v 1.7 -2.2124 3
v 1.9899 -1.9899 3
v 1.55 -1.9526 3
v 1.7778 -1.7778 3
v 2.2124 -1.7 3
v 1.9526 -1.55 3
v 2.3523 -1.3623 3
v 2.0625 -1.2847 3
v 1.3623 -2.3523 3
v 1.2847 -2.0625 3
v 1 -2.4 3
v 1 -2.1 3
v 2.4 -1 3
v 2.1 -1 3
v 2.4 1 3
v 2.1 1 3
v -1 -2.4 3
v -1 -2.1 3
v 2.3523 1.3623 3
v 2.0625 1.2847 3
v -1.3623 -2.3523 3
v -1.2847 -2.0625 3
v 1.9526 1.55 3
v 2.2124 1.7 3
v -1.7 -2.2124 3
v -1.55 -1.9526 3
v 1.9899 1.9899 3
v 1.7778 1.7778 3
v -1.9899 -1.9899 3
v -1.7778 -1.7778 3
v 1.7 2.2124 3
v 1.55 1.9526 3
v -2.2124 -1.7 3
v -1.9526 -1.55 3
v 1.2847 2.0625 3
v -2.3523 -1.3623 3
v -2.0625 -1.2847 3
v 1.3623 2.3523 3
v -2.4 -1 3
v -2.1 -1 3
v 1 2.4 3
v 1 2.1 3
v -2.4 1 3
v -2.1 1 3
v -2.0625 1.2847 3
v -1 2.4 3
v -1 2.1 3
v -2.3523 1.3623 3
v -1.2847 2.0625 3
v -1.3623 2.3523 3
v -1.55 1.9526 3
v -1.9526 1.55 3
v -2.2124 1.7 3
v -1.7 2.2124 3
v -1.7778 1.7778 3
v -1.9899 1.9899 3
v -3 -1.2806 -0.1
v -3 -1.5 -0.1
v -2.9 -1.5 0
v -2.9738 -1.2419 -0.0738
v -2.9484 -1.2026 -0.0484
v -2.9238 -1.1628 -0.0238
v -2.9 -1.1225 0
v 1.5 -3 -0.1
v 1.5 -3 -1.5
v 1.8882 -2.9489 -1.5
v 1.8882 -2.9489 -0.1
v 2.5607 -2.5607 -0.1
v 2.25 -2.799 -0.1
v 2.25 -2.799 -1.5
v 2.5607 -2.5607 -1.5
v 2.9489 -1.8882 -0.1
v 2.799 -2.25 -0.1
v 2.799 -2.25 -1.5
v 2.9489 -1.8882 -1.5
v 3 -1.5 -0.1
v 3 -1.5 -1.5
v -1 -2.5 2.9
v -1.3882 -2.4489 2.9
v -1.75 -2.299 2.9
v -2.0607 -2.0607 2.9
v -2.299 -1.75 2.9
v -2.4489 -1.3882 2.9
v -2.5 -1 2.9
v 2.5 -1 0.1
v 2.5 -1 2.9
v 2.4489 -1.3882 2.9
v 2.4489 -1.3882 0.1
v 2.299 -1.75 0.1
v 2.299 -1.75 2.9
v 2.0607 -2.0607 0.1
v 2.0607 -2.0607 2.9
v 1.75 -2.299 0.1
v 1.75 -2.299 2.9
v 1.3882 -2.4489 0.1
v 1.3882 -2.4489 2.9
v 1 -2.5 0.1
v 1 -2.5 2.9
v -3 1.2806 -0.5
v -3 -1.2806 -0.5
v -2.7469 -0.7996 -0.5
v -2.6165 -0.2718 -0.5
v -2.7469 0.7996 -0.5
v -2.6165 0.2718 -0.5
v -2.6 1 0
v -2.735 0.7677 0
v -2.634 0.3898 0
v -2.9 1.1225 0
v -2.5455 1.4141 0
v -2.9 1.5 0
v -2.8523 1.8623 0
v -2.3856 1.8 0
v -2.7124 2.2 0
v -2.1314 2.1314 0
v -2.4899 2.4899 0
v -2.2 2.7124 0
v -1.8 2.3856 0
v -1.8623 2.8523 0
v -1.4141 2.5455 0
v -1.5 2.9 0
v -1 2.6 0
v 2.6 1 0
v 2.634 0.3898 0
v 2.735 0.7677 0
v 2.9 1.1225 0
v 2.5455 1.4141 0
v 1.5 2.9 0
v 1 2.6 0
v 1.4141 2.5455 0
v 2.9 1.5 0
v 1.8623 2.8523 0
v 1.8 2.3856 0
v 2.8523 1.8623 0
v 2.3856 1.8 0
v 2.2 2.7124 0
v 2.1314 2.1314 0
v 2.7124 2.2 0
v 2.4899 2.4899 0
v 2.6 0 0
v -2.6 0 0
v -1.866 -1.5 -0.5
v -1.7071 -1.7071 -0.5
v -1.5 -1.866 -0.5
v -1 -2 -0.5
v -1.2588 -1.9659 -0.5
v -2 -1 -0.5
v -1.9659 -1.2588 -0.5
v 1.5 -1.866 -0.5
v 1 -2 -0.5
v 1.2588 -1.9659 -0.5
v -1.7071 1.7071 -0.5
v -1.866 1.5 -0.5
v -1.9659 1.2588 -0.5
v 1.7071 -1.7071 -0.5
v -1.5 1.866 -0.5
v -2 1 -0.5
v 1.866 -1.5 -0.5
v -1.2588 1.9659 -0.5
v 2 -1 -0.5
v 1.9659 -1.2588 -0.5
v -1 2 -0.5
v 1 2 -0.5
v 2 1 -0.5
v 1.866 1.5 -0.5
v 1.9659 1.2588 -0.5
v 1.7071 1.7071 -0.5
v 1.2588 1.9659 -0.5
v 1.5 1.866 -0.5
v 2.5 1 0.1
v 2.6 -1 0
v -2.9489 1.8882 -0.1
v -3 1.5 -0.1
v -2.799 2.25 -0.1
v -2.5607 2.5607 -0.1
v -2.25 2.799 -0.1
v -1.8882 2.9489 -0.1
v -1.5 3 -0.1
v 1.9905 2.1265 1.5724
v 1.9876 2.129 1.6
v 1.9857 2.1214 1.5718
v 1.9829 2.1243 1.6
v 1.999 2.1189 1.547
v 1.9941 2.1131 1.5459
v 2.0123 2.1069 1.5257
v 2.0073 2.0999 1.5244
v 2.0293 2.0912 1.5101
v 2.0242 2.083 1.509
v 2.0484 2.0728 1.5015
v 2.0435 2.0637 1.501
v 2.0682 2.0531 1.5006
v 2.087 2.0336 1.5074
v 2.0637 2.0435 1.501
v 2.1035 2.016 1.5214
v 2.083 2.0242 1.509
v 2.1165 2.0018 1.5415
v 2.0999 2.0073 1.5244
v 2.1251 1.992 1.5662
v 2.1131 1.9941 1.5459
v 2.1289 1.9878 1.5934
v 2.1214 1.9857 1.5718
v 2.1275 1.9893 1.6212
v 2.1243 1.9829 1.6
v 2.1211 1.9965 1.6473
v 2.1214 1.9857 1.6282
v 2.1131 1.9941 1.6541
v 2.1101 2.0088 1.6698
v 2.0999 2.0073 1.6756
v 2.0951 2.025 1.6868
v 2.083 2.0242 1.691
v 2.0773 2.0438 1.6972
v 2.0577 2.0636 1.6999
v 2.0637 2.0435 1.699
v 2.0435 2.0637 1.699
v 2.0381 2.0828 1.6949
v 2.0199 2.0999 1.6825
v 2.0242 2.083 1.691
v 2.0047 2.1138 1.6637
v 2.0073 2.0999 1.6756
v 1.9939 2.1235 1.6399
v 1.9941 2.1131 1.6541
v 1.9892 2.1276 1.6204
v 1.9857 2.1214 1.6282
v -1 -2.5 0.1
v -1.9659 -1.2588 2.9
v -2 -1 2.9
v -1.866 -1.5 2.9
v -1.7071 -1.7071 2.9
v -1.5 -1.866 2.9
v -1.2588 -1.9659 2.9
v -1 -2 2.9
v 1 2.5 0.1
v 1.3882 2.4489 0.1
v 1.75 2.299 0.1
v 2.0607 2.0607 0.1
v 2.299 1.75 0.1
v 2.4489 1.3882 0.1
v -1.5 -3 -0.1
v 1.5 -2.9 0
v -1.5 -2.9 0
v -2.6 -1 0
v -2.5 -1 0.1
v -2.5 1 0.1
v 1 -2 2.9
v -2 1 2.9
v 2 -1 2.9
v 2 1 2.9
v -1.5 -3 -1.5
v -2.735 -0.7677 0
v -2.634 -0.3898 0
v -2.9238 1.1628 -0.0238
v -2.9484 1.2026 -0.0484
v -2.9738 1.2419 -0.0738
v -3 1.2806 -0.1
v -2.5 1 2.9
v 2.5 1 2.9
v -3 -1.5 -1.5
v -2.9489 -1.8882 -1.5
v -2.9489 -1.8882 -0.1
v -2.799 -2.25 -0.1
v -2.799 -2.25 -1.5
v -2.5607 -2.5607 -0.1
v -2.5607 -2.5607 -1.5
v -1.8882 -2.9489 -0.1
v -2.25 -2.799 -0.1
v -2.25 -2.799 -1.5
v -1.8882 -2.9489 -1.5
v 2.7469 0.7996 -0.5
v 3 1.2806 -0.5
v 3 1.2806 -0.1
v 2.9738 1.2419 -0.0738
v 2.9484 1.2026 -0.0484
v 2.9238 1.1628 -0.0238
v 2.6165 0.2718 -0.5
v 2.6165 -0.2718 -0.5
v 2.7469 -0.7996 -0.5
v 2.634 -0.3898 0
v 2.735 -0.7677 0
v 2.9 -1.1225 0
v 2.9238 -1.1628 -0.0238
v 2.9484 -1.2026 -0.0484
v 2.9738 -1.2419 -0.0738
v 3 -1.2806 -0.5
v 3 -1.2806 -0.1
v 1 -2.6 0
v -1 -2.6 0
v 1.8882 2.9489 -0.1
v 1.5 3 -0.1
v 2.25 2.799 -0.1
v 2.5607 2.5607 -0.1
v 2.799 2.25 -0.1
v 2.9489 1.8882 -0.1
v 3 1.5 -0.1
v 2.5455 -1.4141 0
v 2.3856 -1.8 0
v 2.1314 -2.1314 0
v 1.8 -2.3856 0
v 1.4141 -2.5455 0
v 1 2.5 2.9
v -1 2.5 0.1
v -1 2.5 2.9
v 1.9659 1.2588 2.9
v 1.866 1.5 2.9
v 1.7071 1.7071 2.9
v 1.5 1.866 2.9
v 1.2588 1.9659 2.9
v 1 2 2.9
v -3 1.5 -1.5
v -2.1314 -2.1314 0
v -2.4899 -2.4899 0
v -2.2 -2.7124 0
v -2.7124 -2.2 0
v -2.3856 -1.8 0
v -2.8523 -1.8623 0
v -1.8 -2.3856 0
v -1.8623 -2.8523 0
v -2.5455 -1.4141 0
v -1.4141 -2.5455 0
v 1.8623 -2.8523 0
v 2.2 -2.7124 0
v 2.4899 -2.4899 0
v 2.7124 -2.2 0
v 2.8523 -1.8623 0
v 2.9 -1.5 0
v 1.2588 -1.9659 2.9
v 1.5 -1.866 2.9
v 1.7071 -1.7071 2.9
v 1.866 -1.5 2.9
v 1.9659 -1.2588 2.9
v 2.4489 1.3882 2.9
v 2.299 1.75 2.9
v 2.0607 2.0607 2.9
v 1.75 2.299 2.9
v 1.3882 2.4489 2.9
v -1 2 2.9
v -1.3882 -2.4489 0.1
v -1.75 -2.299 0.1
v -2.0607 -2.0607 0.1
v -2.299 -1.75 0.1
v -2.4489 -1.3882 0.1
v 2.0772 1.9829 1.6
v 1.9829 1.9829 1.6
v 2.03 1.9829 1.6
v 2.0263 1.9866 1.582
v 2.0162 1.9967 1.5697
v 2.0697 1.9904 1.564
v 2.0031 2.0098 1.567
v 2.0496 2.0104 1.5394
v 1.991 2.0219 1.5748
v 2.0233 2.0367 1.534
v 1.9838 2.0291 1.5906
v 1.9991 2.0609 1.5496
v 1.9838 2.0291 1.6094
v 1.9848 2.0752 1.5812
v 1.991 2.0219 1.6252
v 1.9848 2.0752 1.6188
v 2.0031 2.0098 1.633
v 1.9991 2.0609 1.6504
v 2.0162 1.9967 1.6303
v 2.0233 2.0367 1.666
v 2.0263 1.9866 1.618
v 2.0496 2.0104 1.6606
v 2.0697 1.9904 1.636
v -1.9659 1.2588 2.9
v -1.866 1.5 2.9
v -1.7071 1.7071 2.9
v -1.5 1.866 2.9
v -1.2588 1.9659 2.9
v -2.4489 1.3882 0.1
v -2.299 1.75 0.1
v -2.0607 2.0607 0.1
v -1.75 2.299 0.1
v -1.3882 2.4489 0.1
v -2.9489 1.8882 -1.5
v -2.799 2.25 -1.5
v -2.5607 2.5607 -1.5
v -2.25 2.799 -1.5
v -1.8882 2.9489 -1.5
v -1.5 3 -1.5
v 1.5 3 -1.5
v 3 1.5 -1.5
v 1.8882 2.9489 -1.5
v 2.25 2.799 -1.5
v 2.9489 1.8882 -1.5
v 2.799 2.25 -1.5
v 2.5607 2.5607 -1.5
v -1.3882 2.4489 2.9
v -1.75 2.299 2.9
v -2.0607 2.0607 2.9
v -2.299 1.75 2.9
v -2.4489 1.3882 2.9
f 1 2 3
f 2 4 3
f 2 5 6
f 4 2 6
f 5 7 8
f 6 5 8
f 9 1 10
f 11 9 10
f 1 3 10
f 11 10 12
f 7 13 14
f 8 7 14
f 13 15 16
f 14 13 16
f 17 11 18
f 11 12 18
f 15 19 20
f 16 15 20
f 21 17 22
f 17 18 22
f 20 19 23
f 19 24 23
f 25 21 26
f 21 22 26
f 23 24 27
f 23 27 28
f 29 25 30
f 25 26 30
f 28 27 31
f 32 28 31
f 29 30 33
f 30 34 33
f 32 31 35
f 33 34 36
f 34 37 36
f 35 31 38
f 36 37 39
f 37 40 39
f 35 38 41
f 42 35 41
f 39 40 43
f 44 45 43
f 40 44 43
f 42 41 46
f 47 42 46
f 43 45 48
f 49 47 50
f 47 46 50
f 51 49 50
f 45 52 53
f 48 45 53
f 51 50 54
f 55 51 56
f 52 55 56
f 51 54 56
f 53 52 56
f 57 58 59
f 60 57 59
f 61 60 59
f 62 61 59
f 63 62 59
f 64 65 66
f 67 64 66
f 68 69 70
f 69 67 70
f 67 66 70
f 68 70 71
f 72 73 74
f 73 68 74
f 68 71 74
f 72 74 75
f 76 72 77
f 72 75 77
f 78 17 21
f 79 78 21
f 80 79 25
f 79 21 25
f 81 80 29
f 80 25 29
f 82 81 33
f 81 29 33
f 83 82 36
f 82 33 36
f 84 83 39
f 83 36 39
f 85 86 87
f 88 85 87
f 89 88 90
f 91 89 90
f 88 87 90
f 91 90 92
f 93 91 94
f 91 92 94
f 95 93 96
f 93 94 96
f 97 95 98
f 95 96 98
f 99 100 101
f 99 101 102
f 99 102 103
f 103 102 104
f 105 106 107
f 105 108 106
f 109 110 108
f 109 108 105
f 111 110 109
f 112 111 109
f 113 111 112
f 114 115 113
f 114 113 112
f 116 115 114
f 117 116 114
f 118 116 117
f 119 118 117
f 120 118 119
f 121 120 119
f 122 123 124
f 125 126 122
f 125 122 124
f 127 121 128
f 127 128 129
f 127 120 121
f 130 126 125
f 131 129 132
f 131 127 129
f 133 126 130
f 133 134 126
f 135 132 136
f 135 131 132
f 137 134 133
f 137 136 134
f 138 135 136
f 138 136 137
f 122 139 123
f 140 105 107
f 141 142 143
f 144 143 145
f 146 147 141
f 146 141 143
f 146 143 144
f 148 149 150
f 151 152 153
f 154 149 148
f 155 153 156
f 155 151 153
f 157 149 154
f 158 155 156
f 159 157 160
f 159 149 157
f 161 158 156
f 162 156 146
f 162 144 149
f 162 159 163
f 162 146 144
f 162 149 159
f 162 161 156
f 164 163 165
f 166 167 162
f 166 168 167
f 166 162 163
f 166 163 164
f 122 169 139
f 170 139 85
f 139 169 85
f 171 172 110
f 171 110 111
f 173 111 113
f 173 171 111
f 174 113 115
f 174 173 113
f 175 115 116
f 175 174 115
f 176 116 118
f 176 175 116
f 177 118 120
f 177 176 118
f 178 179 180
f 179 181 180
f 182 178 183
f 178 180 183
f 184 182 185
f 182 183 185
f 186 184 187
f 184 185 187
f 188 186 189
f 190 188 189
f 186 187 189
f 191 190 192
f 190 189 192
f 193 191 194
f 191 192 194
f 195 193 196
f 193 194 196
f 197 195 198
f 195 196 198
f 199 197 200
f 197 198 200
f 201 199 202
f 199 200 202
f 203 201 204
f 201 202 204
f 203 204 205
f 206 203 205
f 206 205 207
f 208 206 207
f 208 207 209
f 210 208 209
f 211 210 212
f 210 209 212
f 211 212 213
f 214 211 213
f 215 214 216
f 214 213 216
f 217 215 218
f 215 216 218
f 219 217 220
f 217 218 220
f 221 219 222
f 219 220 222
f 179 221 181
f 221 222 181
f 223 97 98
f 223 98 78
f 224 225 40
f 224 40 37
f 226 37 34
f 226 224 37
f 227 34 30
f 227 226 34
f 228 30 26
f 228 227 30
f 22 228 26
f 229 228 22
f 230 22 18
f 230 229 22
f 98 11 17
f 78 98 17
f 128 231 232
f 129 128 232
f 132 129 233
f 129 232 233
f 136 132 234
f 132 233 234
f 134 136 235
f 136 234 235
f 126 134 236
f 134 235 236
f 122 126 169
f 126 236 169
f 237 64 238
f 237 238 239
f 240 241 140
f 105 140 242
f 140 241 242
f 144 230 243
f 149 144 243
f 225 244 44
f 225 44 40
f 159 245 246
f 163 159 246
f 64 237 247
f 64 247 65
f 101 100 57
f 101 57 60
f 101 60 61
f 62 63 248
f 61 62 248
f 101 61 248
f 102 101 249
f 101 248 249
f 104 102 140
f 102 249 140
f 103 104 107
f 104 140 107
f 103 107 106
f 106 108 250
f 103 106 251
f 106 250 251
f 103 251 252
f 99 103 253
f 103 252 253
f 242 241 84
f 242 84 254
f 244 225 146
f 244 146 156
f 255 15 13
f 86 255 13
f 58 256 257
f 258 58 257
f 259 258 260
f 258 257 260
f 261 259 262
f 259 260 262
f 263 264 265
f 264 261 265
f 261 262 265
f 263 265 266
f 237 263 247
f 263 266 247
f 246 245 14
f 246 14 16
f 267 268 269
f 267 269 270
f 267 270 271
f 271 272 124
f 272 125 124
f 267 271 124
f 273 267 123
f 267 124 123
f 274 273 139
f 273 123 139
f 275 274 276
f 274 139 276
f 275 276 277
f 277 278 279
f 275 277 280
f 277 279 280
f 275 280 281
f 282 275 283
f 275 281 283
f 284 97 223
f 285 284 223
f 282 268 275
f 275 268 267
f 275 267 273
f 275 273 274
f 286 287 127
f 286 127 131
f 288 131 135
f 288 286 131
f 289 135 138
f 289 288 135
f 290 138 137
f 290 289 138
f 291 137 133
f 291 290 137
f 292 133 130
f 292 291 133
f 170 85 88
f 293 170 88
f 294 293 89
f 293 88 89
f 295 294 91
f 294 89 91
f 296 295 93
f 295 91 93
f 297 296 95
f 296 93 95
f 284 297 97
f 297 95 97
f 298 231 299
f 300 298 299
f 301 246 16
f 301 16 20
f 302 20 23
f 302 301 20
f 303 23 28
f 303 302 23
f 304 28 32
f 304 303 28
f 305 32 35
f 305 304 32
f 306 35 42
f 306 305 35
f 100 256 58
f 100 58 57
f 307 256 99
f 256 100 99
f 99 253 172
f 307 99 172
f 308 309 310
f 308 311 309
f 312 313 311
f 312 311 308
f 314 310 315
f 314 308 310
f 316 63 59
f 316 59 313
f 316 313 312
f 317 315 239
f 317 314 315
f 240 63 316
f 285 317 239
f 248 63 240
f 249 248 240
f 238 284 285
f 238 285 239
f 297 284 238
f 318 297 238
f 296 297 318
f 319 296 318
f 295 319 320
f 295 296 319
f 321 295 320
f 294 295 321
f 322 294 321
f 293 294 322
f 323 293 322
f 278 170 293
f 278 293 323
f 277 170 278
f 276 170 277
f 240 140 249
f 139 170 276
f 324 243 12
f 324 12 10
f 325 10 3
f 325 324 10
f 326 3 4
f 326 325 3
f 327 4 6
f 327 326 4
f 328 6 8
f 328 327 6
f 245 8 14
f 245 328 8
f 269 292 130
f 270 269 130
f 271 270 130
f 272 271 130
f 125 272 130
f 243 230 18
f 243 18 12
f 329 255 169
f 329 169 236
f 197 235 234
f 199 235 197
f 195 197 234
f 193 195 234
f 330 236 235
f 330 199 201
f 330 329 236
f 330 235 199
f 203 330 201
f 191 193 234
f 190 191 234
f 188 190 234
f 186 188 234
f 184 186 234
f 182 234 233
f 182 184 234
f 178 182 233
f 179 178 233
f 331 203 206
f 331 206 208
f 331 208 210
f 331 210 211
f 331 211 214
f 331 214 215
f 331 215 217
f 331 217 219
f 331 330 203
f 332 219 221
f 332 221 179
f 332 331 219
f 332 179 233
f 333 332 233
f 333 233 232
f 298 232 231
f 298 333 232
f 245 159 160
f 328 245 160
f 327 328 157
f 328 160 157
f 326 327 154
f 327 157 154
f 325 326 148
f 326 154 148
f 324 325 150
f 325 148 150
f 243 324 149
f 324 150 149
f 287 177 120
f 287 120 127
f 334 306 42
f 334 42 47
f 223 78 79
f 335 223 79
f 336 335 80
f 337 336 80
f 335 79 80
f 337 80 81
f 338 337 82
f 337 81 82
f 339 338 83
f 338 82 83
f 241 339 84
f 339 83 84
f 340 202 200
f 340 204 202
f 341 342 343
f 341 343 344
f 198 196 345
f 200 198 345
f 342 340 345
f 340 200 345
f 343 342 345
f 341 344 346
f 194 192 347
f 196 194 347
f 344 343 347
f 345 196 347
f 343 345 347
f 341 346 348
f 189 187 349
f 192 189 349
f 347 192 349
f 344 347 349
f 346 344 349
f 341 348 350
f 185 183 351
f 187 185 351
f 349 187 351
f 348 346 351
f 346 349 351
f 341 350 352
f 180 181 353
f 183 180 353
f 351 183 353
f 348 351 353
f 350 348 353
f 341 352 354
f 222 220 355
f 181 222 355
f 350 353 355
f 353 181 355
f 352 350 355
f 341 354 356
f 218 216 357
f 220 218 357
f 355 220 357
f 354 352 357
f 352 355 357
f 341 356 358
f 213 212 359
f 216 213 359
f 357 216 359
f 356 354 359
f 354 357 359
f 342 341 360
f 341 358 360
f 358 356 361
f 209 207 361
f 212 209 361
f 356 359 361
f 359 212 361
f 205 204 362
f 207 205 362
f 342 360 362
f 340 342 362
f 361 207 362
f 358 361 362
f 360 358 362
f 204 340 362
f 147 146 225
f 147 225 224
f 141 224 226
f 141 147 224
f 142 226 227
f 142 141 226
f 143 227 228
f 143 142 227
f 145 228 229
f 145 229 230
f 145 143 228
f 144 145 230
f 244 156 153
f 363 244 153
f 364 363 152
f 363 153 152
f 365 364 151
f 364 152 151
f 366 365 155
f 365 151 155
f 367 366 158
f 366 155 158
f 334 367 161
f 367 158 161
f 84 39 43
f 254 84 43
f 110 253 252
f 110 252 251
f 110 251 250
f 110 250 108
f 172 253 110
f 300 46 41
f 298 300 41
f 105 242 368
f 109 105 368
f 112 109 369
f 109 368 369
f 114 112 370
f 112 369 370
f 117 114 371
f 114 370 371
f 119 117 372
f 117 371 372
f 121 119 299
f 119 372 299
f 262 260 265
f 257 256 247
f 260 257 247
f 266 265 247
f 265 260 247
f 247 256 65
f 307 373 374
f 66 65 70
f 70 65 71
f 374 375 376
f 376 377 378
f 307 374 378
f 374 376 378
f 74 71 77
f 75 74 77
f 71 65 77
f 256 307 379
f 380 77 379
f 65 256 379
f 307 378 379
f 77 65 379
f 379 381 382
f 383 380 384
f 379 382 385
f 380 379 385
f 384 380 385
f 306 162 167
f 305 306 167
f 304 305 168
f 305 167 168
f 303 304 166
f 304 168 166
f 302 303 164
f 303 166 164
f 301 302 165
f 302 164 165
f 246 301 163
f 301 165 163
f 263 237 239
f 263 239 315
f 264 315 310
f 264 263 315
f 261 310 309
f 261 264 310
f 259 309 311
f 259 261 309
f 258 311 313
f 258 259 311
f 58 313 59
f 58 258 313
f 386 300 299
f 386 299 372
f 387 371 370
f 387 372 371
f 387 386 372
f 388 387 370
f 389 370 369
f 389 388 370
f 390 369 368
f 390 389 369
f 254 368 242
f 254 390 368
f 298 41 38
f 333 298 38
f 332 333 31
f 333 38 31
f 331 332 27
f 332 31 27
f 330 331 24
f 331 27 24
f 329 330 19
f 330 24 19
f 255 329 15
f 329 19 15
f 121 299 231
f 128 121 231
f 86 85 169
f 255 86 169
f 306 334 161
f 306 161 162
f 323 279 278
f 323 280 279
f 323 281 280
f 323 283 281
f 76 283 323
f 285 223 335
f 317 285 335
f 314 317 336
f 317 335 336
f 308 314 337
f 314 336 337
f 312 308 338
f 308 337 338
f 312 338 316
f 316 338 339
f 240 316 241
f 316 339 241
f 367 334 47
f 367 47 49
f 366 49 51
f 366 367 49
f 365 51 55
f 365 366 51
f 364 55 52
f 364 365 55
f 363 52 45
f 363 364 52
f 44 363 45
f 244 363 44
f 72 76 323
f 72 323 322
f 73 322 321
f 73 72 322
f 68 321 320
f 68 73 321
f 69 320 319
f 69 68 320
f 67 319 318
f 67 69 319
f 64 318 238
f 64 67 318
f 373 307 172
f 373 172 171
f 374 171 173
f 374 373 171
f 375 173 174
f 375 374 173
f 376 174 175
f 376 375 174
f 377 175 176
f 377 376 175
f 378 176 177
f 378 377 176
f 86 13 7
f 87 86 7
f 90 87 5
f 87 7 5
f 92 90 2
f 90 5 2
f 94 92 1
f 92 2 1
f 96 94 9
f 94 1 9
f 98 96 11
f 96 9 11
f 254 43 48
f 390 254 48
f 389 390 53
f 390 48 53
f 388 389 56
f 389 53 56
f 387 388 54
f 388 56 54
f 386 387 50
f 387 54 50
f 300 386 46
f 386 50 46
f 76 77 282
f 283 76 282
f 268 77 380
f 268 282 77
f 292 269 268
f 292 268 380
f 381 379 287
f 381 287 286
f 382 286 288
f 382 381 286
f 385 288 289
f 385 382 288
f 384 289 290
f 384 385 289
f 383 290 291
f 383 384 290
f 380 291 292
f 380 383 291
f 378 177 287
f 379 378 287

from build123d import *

# Parameters (mm, degrees)
SKIZZE1_W                            = 6
SKIZZE1_H                            = 6
AUFSATZ_LINEAR_AUSTRAGEN1_DEPTH      = 1.5
SKIZZE2_W                            = 5
SKIZZE2_H                            = 5
AUFSATZ_LINEAR_AUSTRAGEN2_DEPTH      = 3
SKIZZE3_W                            = 4
SKIZZE3_H                            = 4
SCHNITT_LINEAR_AUSTRAGEN1_DEPTH      = 3.5
VERRUNDUNG1_R                        = 1
VERRUNDUNG2_R                        = 1.5
VERRUNDUNG3_R                        = 1.5
FASE1_SIZE                           = 0.1
F_0_2_0_2_DURCHMESSER_BOHRUNG5_D     = 0.2
F_0_2_0_2_DURCHMESSER_BOHRUNG5_DEPTH = 0.01
F_0_2_0_2_DURCHMESSER_BOHRUNG5_TIP   = 0.1
SKIZZE7_R                            = 2.25
SCHNITT_LINEAR_AUSTRAGEN2_DEPTH      = 0.5


with BuildPart() as part:
    # Skizze1 → Aufsatz-Linear austragen1 (new body)
    with BuildSketch(Plane.XY):
        Rectangle(SKIZZE1_W, SKIZZE1_H)
    extrude(amount=-AUFSATZ_LINEAR_AUSTRAGEN1_DEPTH)

    # Skizze2 → Aufsatz-Linear austragen2 (add)
    with BuildSketch(Plane(origin=(0, 0, 0), x_dir=(-1, 0, 0), z_dir=(0, 0, -1))):
        Rectangle(SKIZZE2_W, SKIZZE2_H)
    extrude(amount=-AUFSATZ_LINEAR_AUSTRAGEN2_DEPTH)

    # Skizze3 → Schnitt-Linear austragen1 (cut)
    with BuildSketch(Plane.XY.offset(3)):
        Rectangle(SKIZZE3_W, SKIZZE3_H)
    extrude(amount=-SCHNITT_LINEAR_AUSTRAGEN1_DEPTH, mode=Mode.SUBTRACT)

    # Verrundung1
    verrundung1_edges = [part.edges().sort_by_distance(p)[0] for p in [
        (2, 2, 1.25),
        (2, -2, 1.25),
        (-2, -2, 1.25),
        (-2, 2, 1.25),
    ]]
    fillet(verrundung1_edges, radius=VERRUNDUNG1_R)

    # Verrundung2
    verrundung2_edges = [part.edges().sort_by_distance(p)[0] for p in [
        (-2.5, 2.5, 1.5),
        (-2.5, -2.5, 1.5),
        (2.5, -2.5, 1.5),
        (2.5, 2.5, 1.5),
    ]]
    fillet(verrundung2_edges, radius=VERRUNDUNG2_R)

    # Verrundung3
    verrundung3_edges = [part.edges().sort_by_distance(p)[0] for p in [
        (3, -3, -0.75),
        (-3, -3, -0.75),
        (-3, 3, -0.75),
        (3, 3, -0.75),
    ]]
    fillet(verrundung3_edges, radius=VERRUNDUNG3_R)

    # Fase1
    fase1_edges = [part.edges().sort_by_distance(p)[0] for p in [
        (0, -2, 3),
        (-2, 0, 3),
        (2, 0, 3),
        (0, 2, 3),
        (-1.707106781, -1.707106781, 3),
        (1.707106781, -1.707106781, 3),
        (1.707106781, 1.707106781, 3),
        (-1.707106781, 1.707106781, 3),
        (0, -2.5, 0),
        (0, -2.5, 3),
        (-2.5, 0, 0),
        (-2.5, 0, 3),
        (2.5, 0, 3),
        (0, 2.5, 3),
        (-2.060660172, 2.060660172, 3),
        (2.060660172, 2.060660172, 3),
        (2.060660172, -2.060660172, 3),
        (-2.060660172, -2.060660172, 3),
        (2.5, 0, 0),
        (0, 2.5, 0),
        (-2.060660172, -2.060660172, 0),
        (2.060660172, -2.060660172, 0),
        (2.060660172, 2.060660172, 0),
        (-2.060660172, 2.060660172, 0),
        (-3, 0, 0),
        (3, 0, 0),
        (0, 3, 0),
        (0, -3, 0),
        (-2.560660172, 2.560660172, 0),
        (2.560660172, 2.560660172, 0),
        (2.560660172, -2.560660172, 0),
        (-2.560660172, -2.560660172, 0),
    ]]
    chamfer(fase1_edges, length=FASE1_SIZE)

    # Ø0.2 (0.2) Durchmesser Bohrung5
    with Locations(Plane(origin=(2.060660172, 2.060660172, 0), x_dir=(0.707106781, -0.707106781, 0), z_dir=(0.707106781, 0.707106781, 0))):
        with Locations((0, -1.6)):
            Hole(F_0_2_0_2_DURCHMESSER_BOHRUNG5_D / 2, depth=F_0_2_0_2_DURCHMESSER_BOHRUNG5_DEPTH)
            with Locations((0, 0, -(F_0_2_0_2_DURCHMESSER_BOHRUNG5_DEPTH + F_0_2_0_2_DURCHMESSER_BOHRUNG5_TIP / 2))):  # 90° drill point
                Cone(0, F_0_2_0_2_DURCHMESSER_BOHRUNG5_D / 2, F_0_2_0_2_DURCHMESSER_BOHRUNG5_TIP, mode=Mode.SUBTRACT)

    # Skizze7 → Schnitt-Linear austragen2 (cut)
    with BuildSketch(Plane.XY):
        with Locations((-4.85, 0)):
            Circle(SKIZZE7_R)
        with Locations((4.85, 0)):
            Circle(SKIZZE7_R)
    extrude(amount=-SCHNITT_LINEAR_AUSTRAGEN2_DEPTH, mode=Mode.SUBTRACT)


solid = part.part
